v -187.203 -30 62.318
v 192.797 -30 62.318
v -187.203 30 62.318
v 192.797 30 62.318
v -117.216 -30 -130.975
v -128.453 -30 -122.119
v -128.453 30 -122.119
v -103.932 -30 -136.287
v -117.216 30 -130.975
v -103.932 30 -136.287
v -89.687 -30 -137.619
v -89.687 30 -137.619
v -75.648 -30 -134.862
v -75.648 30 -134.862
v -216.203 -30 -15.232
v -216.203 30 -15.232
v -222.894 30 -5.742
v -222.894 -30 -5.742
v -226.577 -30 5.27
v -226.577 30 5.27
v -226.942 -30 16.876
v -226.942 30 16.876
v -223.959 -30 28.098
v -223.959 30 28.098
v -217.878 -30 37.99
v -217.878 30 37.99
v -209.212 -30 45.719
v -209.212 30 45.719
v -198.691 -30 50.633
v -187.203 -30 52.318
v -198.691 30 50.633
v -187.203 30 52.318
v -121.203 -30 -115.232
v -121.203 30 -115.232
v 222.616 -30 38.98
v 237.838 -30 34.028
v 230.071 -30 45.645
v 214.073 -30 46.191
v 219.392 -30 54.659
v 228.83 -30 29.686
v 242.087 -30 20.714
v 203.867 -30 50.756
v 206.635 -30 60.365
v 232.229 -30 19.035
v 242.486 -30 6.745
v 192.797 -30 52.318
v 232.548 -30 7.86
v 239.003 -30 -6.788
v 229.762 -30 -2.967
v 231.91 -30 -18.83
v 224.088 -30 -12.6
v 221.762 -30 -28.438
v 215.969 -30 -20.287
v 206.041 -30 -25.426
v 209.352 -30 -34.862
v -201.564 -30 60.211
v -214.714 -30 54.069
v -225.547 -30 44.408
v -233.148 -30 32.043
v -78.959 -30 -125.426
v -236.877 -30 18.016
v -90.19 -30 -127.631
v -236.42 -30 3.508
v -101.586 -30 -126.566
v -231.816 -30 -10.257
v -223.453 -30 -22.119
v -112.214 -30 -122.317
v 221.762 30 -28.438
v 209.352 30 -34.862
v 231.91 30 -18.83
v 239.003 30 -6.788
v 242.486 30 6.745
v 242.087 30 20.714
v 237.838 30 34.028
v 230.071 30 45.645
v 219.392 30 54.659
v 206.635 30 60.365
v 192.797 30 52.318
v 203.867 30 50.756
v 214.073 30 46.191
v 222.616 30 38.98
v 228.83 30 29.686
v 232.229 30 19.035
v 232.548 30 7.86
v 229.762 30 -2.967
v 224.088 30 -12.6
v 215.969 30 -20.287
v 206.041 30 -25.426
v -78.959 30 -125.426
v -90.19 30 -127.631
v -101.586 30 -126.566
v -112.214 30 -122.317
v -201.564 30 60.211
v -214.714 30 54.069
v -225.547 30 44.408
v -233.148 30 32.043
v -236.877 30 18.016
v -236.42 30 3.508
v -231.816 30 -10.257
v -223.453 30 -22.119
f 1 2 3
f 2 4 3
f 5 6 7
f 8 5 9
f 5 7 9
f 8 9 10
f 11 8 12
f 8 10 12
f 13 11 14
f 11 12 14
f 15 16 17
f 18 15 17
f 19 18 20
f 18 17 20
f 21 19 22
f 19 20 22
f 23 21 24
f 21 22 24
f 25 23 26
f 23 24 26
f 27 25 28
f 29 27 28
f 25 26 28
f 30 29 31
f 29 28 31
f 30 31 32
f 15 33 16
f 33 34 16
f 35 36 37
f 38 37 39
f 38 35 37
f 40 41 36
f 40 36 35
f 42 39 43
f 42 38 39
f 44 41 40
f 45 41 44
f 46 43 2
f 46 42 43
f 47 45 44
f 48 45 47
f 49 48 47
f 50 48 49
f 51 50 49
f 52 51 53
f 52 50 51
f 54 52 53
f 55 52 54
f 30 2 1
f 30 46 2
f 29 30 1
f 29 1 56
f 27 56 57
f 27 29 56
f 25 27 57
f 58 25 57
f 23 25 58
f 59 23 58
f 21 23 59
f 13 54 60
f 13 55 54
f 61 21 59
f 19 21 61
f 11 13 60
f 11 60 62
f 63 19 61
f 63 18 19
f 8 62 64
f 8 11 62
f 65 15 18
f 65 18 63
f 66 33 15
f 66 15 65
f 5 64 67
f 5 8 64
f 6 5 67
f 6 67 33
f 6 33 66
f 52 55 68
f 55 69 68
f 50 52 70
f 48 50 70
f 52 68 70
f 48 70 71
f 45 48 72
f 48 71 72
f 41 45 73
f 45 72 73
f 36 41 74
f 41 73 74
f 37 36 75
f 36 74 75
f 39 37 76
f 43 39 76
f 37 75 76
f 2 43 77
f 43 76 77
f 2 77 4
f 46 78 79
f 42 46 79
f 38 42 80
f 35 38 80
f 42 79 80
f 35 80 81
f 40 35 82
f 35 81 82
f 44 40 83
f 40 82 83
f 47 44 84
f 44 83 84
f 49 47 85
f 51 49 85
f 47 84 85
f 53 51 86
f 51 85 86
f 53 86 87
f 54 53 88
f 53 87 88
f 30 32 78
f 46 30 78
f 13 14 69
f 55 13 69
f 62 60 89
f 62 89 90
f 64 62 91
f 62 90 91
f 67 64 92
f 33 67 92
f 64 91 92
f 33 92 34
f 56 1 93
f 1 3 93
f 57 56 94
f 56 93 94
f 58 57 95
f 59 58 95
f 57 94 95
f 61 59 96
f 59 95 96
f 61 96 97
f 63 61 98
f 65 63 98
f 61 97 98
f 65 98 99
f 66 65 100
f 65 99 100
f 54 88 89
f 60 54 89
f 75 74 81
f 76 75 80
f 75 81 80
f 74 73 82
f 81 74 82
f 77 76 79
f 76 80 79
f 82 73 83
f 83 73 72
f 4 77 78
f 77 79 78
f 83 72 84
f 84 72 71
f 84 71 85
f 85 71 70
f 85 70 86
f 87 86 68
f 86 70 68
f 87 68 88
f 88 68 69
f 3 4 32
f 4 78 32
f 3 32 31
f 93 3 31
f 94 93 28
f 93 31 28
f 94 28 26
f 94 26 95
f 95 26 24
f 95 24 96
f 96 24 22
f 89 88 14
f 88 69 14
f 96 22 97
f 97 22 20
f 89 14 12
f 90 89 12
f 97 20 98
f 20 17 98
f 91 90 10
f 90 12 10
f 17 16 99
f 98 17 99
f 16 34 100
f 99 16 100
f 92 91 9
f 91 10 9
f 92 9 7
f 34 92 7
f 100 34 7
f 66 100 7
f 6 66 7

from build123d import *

# Parameters (mm, degrees)
EXTRUDE_1_DEPTH = 15
SCALE1_SCALE    = 2


with BuildPart() as part:
    # 草图1 → 凸台-拉伸1 (new, symmetric)
    with BuildSketch(Plane(origin=(0, 0, 0), x_dir=(1, 0, 0), z_dir=(0, 1, 0))):
        with BuildLine():
            Line((-39.222807174, 73.589999553), (103.277192826, 23.589999553))
            ThreePointArc((103.277192826, 23.589999553), (119.644979091, -4.198214571), (95, -25))
            Line((95, -25), (-95, -25))
            ThreePointArc((-95, -25), (-117.972466277, -9.862342174), (-113.12498584, 17.218736548))
            Line((-113.12498584, 17.218736548), (-65.62498584, 67.218736548))
            ThreePointArc((-65.62498584, 67.218736548), (-53.36455496, 74.302407188), (-39.222807174, 73.589999553))
        make_face()
        with BuildLine():
            Line((-61.999988672, 63.774989238), (-109.499988672, 13.774989238))
            ThreePointArc((-109.499988672, 13.774989238), (-113.377973022, -7.889873739), (-95, -20))
            Line((-95, -20), (95, -20))
            ThreePointArc((95, -20), (114.715983273, -3.358571657), (101.621754261, 18.871999643))
            Line((101.621754261, 18.871999643), (-40.878245739, 68.871999643))
            ThreePointArc((-40.878245739, 68.871999643), (-52.191643968, 69.44192575), (-61.999988672, 63.774989238))
        make_face(mode=Mode.SUBTRACT)
    extrude(amount=EXTRUDE_1_DEPTH, both=True)


with BuildPart() as part_1:
    # Scale1: scaled about (-2.797311239, 0, -12.318069734)
    add(part.part.scale(SCALE1_SCALE).moved(Location((2.797311239, 0, 12.318069734))))


solid = part_1.part
